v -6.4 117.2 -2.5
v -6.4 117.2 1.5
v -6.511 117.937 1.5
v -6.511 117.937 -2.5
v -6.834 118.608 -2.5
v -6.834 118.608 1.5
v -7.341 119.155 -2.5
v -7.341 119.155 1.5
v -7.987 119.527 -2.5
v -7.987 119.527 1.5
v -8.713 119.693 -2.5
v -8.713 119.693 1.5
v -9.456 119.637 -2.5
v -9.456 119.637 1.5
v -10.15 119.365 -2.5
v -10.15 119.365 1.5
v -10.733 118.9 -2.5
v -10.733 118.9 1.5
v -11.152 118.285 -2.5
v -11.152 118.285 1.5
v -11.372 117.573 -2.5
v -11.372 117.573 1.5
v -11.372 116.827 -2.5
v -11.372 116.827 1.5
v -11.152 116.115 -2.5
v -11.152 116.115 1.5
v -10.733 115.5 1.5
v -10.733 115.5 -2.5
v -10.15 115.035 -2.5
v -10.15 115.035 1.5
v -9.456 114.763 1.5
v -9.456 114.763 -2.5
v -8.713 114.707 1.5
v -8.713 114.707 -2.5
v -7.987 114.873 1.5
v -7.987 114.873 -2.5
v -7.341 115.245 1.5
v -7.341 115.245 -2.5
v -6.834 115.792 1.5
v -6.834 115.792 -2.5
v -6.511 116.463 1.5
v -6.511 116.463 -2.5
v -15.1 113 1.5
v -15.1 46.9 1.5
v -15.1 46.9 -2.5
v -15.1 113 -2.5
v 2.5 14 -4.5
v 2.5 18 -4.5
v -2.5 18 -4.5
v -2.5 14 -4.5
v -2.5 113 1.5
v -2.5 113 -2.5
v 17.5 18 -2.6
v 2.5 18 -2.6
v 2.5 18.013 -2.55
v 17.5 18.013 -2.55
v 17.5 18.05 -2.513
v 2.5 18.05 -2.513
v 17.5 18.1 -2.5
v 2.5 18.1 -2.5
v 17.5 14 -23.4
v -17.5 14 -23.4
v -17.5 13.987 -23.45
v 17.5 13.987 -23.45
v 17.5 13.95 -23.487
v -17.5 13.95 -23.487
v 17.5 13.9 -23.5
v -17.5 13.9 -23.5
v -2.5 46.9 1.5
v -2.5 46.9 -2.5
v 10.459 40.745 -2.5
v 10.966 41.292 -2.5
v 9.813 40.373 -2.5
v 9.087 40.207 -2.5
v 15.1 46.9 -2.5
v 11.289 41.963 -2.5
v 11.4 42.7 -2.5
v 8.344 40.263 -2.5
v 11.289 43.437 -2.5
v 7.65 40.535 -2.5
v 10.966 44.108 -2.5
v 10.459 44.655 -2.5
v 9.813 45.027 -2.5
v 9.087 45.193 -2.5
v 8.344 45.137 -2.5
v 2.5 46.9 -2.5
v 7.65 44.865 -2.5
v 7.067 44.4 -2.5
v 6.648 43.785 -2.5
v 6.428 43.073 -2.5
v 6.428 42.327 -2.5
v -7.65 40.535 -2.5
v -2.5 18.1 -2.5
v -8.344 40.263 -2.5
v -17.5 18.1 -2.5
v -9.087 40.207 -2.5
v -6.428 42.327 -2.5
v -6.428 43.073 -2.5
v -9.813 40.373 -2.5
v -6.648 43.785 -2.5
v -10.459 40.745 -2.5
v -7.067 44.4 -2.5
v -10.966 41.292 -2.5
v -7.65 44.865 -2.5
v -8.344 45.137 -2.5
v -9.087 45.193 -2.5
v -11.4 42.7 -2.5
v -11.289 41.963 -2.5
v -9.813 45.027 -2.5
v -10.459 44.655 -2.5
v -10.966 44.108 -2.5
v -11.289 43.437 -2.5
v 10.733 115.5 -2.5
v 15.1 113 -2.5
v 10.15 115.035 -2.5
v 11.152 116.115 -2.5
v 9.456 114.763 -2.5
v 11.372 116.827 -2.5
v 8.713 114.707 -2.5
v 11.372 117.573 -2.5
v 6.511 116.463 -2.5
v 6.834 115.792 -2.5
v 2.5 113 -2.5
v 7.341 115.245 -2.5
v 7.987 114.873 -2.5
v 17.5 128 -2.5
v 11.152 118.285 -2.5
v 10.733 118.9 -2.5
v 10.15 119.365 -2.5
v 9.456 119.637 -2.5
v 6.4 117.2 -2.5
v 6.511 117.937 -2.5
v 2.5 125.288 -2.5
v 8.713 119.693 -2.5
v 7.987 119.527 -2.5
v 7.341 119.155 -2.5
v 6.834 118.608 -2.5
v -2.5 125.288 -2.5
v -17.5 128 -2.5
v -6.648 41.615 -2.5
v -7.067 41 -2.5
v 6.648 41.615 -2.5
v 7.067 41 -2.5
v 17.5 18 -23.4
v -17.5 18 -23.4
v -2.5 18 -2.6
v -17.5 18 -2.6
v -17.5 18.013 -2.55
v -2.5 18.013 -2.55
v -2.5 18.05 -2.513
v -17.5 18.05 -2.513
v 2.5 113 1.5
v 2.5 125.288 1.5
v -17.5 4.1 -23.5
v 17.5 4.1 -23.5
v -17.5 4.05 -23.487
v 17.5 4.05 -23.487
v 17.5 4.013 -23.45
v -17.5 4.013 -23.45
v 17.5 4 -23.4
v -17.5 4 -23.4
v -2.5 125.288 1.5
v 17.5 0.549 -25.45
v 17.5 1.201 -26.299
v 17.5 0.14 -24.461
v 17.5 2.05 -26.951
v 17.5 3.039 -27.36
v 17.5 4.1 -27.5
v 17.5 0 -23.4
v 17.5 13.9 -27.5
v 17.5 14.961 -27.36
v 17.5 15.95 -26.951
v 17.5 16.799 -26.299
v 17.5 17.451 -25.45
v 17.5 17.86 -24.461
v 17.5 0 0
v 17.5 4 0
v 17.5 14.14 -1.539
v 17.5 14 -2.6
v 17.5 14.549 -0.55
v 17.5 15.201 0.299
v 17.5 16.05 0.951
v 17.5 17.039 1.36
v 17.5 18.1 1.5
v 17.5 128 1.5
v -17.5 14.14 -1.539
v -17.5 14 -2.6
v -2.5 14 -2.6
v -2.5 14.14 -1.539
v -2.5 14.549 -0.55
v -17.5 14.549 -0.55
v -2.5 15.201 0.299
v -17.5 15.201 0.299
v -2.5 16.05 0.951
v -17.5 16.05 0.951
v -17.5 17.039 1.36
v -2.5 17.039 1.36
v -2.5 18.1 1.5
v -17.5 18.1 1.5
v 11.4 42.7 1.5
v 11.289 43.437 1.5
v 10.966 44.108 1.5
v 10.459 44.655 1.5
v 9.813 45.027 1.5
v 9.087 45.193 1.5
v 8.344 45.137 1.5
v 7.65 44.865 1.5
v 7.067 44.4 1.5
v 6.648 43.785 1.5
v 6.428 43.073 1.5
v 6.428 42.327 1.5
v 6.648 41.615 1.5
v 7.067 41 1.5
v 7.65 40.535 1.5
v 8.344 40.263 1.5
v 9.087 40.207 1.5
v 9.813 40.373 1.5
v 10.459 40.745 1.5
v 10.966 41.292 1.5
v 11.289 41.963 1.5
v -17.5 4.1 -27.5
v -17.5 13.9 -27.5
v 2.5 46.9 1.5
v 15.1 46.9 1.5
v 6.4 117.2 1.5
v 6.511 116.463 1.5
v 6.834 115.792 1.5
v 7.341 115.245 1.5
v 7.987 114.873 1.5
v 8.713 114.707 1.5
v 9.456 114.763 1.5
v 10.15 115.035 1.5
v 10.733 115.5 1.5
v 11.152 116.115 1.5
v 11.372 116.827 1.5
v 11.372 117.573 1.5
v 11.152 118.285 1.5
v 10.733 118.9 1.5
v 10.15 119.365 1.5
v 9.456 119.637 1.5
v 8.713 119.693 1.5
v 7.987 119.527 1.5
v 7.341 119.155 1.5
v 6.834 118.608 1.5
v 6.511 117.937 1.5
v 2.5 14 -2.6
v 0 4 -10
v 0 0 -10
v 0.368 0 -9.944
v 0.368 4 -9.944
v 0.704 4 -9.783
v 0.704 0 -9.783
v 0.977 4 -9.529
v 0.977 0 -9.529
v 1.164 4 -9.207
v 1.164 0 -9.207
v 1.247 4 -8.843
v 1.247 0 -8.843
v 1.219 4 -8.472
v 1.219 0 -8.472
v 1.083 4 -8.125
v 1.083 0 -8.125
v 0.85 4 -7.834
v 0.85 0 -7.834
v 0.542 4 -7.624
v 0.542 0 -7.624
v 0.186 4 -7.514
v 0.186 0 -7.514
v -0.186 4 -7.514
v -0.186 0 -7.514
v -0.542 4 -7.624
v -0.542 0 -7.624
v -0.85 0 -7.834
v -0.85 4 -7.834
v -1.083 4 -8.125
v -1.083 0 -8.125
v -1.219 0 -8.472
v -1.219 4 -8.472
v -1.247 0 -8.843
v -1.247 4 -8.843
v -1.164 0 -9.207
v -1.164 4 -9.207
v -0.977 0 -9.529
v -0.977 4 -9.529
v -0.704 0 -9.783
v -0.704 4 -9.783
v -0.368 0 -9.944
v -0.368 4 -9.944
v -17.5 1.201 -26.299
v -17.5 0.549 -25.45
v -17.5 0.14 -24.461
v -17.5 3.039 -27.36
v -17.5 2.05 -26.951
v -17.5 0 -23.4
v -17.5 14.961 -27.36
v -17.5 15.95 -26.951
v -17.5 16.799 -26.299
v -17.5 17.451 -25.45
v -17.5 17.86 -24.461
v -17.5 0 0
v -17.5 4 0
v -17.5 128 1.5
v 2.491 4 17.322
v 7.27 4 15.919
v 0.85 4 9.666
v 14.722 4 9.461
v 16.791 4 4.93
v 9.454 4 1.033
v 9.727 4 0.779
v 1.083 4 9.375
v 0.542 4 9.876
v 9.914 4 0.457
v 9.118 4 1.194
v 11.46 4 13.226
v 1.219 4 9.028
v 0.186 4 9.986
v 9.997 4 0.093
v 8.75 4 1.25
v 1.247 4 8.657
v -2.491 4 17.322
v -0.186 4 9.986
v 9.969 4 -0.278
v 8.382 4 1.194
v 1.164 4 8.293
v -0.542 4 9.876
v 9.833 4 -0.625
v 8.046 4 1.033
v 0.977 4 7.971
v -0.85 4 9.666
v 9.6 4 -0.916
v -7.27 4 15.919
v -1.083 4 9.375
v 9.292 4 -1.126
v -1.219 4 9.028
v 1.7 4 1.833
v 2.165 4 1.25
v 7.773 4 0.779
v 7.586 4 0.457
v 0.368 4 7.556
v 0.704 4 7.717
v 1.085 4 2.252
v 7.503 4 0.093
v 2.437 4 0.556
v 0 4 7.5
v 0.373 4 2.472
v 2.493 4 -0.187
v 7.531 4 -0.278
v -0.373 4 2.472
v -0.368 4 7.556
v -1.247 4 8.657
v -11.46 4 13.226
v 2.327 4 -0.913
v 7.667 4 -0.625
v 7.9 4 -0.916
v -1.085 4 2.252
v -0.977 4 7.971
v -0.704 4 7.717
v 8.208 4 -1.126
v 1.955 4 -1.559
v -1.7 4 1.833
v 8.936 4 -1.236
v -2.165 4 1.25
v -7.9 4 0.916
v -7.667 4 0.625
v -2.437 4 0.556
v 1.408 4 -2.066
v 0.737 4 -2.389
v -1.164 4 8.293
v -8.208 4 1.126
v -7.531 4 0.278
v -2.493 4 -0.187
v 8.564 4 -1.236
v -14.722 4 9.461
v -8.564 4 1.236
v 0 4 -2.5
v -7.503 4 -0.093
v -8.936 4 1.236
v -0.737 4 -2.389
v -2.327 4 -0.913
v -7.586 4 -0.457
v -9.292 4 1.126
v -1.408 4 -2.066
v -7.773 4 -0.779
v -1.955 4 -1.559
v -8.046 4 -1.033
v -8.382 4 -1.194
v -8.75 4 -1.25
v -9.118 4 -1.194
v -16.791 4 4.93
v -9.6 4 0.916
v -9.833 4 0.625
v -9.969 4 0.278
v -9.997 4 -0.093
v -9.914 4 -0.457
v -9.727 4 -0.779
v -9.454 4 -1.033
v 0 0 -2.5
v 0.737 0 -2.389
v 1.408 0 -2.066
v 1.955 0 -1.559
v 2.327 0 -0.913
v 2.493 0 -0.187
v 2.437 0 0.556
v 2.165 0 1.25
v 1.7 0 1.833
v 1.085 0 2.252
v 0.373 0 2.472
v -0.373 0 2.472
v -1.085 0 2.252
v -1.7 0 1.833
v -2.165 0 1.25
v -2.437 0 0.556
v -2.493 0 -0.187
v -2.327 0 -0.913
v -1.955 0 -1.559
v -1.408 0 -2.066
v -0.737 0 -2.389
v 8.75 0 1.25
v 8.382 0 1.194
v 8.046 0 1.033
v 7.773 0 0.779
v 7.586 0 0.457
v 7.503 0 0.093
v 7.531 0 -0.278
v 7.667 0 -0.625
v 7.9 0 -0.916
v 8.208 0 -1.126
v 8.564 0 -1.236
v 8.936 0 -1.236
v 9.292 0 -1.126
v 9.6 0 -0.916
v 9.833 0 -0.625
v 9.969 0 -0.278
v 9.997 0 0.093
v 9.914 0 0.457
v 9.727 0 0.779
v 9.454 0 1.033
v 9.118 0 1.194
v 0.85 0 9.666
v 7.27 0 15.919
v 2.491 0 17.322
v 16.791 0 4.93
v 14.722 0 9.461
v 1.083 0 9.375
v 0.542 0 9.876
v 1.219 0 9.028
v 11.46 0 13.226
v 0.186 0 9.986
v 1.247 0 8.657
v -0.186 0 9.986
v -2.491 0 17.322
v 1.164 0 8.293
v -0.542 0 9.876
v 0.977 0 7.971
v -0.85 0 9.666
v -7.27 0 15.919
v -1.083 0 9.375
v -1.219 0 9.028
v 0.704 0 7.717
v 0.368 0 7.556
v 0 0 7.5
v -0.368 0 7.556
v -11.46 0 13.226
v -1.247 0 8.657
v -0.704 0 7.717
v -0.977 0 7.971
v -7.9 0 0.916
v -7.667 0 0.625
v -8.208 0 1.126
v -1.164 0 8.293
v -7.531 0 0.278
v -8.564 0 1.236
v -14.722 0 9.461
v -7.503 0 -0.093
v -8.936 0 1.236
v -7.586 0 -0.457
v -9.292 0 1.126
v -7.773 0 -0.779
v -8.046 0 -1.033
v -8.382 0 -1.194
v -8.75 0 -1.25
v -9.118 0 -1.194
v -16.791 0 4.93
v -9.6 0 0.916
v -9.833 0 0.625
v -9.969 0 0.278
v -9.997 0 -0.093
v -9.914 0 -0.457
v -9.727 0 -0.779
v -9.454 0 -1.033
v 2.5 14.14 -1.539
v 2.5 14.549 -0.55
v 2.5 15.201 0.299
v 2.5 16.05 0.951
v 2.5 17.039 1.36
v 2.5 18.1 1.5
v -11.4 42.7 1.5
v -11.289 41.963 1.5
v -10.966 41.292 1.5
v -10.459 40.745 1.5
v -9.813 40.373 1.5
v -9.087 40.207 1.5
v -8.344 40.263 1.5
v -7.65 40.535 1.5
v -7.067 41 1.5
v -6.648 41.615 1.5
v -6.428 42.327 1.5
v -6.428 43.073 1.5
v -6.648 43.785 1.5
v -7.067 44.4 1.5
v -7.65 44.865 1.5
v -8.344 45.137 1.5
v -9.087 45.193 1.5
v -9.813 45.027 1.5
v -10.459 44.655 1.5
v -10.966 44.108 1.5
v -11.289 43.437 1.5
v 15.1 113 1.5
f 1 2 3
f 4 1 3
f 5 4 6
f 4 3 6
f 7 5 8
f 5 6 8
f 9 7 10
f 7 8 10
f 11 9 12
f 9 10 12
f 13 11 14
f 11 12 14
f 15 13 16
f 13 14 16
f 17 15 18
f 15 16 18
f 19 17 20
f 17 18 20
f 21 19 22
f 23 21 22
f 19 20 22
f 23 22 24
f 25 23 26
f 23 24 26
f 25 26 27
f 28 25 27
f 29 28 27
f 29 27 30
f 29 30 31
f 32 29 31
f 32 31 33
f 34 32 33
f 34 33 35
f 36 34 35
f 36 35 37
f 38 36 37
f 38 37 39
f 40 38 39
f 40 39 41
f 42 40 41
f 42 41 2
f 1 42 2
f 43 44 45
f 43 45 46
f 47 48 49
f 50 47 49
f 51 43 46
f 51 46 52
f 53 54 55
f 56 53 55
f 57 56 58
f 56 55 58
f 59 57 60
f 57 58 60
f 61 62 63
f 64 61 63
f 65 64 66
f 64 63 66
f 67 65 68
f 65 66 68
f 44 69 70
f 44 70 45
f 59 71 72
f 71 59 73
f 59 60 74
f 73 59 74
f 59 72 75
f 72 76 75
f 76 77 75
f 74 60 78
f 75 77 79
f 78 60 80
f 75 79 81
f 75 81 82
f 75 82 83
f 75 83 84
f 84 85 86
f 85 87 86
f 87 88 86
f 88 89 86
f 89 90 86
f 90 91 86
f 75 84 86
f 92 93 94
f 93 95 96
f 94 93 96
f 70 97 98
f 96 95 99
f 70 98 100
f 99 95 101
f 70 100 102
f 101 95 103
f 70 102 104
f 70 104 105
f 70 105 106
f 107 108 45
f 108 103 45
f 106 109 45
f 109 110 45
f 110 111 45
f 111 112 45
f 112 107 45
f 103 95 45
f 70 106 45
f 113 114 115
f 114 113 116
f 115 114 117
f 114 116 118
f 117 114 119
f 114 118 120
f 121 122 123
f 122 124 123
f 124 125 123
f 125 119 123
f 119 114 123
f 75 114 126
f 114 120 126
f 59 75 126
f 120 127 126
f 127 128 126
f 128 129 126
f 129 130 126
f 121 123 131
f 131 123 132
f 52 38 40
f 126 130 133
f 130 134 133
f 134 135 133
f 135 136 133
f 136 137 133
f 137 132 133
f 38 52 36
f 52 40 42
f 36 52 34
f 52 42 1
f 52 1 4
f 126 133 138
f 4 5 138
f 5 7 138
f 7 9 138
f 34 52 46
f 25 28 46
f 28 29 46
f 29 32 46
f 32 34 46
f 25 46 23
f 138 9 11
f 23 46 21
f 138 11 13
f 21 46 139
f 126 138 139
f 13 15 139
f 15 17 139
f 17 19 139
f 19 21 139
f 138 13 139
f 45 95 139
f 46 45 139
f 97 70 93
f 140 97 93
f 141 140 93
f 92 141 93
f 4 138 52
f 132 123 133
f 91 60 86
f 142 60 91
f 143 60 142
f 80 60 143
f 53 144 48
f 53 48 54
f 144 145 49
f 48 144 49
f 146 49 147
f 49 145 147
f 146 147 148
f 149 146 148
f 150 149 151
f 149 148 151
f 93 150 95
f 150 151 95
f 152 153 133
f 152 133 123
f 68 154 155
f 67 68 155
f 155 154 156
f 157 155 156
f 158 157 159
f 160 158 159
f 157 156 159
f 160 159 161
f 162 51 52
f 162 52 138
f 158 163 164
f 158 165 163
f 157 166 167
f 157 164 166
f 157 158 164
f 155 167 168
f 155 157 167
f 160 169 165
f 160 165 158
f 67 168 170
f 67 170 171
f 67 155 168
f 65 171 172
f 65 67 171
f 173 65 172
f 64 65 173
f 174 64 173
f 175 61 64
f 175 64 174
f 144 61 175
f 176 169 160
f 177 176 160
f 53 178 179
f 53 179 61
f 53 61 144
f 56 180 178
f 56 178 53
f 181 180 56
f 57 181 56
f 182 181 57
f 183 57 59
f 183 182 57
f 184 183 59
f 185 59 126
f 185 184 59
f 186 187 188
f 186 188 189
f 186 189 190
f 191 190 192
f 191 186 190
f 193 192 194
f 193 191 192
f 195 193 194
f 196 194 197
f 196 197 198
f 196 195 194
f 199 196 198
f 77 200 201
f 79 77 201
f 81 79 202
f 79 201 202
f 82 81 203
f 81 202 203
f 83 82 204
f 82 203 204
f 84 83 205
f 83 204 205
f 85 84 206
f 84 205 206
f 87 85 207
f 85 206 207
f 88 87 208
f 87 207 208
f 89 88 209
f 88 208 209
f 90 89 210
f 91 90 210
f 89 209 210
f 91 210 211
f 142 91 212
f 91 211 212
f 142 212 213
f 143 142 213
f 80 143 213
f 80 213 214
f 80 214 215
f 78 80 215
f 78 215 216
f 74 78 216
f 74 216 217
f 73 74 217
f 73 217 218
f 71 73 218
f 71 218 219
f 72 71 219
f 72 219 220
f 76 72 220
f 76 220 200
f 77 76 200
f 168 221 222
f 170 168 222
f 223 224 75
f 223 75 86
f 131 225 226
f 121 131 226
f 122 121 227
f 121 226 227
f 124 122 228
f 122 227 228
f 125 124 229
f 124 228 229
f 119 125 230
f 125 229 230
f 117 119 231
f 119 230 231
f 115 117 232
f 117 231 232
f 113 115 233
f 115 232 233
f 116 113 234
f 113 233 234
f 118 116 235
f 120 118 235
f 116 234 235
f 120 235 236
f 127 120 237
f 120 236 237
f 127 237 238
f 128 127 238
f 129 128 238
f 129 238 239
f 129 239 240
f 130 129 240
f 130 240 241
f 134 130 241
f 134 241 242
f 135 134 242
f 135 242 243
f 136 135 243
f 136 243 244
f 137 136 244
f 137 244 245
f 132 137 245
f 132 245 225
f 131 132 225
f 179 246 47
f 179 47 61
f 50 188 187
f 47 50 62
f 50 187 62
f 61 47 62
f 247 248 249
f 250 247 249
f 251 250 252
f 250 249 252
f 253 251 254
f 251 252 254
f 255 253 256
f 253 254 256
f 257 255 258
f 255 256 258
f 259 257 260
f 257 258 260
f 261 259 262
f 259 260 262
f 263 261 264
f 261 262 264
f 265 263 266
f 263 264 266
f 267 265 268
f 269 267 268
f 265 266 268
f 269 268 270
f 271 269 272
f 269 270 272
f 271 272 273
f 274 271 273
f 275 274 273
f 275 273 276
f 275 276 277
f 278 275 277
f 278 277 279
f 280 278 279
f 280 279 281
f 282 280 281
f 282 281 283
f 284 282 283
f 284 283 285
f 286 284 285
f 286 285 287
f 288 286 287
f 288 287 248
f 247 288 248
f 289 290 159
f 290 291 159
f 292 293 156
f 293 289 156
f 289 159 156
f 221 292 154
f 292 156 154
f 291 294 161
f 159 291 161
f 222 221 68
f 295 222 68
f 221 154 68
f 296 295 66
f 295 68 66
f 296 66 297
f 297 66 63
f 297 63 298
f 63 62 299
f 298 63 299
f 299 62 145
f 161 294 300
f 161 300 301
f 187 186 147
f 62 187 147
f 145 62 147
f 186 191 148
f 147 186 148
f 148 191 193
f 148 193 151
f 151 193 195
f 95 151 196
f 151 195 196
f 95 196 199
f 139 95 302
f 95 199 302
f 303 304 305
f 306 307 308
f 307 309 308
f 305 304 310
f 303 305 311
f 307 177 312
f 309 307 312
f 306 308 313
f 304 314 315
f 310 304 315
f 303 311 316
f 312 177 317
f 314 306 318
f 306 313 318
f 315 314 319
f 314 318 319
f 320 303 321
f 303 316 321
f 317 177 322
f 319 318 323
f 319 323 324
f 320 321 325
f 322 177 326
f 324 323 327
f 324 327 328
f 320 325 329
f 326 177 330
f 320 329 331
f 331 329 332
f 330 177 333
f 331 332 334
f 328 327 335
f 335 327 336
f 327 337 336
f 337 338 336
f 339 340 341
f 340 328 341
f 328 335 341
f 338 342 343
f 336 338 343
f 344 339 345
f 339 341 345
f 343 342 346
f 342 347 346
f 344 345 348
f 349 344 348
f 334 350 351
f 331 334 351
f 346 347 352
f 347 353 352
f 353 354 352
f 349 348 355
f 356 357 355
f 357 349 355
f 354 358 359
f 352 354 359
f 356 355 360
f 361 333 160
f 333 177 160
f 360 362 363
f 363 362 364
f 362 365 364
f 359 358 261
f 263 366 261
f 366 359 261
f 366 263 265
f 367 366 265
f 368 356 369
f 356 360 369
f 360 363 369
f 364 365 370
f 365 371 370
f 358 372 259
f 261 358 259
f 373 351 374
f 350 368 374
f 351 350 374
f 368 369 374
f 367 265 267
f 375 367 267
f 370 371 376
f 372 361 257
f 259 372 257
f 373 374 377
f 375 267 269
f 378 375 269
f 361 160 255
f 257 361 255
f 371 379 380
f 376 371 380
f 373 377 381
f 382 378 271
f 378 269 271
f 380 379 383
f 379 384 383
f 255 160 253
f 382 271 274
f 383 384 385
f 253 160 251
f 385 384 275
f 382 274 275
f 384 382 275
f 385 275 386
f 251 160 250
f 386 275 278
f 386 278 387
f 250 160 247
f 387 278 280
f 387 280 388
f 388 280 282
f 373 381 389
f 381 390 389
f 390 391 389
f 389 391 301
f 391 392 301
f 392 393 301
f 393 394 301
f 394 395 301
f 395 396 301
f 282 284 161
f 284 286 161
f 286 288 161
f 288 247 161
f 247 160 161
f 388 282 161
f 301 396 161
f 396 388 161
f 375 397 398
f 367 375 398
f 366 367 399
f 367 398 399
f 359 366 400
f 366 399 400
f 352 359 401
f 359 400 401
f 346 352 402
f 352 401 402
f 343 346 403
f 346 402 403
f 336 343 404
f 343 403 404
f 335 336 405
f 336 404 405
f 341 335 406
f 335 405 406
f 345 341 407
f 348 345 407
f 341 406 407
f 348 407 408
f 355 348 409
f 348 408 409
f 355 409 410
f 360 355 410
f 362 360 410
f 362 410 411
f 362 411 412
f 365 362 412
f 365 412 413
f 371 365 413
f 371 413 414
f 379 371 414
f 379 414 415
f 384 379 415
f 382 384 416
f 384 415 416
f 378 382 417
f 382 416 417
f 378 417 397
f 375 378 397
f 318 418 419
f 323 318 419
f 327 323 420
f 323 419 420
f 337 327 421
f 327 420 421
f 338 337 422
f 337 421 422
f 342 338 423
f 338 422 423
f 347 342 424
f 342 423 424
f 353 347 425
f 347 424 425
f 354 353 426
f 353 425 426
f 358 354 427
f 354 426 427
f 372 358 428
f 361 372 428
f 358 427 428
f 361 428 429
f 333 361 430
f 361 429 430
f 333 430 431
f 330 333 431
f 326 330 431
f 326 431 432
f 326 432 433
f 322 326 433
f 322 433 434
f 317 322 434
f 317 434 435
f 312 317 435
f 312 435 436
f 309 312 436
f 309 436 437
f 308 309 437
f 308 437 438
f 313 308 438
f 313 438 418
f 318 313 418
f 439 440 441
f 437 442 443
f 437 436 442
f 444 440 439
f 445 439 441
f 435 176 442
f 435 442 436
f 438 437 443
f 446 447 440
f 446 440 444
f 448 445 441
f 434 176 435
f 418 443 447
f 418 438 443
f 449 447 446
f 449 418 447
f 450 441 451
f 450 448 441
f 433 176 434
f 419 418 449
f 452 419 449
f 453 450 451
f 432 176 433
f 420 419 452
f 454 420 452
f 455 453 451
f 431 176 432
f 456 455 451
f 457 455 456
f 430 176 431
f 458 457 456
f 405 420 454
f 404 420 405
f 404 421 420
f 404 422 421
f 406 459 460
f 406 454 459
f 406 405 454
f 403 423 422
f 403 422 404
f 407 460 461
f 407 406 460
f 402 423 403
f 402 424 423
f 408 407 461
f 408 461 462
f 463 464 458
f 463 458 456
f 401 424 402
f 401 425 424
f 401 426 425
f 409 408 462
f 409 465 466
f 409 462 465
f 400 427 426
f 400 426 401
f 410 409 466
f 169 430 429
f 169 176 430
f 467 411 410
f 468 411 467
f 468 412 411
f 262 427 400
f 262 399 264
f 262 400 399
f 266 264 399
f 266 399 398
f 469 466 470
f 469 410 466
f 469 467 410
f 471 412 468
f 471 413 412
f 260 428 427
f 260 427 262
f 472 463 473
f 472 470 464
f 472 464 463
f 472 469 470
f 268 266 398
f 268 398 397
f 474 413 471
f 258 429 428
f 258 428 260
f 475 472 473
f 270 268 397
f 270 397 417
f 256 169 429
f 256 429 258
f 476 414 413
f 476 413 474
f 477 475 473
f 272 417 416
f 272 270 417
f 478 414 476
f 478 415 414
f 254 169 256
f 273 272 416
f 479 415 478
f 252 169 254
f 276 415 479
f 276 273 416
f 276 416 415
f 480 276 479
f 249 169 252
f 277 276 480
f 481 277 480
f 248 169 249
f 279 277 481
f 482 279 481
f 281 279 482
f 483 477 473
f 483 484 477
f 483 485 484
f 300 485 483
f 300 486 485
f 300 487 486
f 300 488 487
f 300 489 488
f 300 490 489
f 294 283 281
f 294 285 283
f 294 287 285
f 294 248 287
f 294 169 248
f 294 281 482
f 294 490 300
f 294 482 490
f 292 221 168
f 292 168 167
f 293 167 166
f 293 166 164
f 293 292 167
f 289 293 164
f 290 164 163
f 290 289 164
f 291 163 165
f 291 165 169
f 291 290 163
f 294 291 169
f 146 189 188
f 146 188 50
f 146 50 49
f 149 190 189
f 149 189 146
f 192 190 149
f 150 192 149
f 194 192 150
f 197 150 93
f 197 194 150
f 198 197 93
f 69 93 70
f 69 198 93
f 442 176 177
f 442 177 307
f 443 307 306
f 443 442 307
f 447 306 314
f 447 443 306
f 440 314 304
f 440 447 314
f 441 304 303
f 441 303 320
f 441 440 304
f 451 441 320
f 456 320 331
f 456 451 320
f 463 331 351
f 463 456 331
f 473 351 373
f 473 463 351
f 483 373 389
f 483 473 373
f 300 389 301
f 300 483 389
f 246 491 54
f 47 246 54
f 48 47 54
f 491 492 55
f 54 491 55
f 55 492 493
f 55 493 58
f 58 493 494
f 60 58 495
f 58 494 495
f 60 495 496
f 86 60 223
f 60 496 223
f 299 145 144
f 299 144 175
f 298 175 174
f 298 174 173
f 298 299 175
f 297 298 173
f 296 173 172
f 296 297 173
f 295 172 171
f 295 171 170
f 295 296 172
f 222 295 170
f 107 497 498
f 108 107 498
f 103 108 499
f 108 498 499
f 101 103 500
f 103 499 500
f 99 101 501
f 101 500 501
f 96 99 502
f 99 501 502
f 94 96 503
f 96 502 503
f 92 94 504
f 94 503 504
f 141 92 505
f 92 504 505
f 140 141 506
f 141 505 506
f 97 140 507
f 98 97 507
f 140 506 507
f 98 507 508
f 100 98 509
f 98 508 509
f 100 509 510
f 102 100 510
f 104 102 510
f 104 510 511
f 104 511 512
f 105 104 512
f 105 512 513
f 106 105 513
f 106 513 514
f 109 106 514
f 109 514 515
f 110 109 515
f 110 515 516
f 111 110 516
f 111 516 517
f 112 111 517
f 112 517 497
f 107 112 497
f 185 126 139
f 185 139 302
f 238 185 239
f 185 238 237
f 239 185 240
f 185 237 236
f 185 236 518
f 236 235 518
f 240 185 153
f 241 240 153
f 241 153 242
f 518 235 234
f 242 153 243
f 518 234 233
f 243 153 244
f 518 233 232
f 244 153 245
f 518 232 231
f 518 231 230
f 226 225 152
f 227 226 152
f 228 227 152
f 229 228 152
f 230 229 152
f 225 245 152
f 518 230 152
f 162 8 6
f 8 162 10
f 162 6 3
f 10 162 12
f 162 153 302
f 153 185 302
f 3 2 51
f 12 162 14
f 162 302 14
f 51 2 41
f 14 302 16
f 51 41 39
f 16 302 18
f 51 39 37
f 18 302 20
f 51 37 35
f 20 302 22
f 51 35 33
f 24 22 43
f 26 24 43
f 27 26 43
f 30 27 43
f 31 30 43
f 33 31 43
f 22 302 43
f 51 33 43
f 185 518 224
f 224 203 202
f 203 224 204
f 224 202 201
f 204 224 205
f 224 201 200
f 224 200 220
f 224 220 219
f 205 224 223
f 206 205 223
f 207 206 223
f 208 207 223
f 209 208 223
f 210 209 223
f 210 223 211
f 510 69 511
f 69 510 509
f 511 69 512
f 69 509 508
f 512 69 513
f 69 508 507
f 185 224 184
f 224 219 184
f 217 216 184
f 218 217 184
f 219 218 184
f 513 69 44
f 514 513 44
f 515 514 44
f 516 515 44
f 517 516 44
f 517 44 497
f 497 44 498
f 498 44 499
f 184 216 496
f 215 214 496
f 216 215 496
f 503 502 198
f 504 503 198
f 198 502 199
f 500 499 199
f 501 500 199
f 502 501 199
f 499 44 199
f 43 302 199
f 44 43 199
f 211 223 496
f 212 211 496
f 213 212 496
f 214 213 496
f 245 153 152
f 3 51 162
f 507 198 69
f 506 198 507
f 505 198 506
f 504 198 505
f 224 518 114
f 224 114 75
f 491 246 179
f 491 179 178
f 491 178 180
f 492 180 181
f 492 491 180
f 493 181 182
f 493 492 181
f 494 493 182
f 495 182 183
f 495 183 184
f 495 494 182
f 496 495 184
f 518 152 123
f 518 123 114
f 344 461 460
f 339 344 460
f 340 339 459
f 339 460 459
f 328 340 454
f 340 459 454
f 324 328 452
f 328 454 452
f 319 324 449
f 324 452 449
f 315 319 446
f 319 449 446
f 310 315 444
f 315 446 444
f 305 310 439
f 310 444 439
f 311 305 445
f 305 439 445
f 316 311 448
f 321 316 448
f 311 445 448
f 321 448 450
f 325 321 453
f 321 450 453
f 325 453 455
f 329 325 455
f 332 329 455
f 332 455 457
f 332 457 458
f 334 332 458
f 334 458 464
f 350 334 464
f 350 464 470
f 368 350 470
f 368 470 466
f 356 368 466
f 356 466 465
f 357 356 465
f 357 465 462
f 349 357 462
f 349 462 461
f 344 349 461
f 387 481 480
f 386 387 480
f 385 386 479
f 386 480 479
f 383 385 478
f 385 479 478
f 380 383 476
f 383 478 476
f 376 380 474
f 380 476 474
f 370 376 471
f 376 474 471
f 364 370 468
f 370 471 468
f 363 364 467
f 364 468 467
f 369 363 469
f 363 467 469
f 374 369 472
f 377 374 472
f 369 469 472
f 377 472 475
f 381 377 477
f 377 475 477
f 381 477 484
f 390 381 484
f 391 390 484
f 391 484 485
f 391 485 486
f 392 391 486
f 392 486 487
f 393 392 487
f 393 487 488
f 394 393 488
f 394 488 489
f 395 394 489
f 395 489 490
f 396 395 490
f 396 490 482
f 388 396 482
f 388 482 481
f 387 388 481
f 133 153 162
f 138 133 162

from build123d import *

# Parameters (mm, degrees)
BOSS_EXTRUDE2_DEPTH    = 4
SKETCH4_W              = 35
SKETCH4_H              = 4
BOSS_EXTRUDE3_DEPTH    = 10
BOSS_EXTRUDE4_DEPTH    = 35
SKETCH9_R              = 2.5
CUT_EXTRUDE1_DEPTH     = 6
SKETCH10_R             = 1.25
CUT_EXTRUDE2_DEPTH     = 6
SKETCH11_R             = 2.5
CUT_EXTRUDE3_DEPTH     = 4
CONVERT_SOLID2_START   = -17.5
CONVERT_SOLID2_DEPTH   = 35
CONVERT_SOLID2_2_DEPTH = 35
CONVERT_SOLID2_3_DEPTH = 15
CONVERT_SOLID2_START_2 = 2.5
CONVERT_SOLID2_4_DEPTH = 15


# Read off the part's stored shape, not the designer's step: Convert-Solid2
with BuildPart() as part:
    # Sketch3 → Boss-Extrude2 (new body)
    with BuildSketch(Plane(origin=(0, 0, 0), x_dir=(1, 0, 0), z_dir=(0, 1, 0))):
        with BuildLine():
            Line((-17.5, 0), (-17.5, 27.5))
            Line((-17.5, 27.5), (17.5, 27.5))
            Line((17.5, 27.5), (17.5, 0))
            ThreePointArc((17.5, 0), (0, -17.5), (-17.5, 0))
        make_face()
    extrude(amount=BOSS_EXTRUDE2_DEPTH)

    # Sketch4 → Boss-Extrude3 (add)
    with BuildSketch(Plane(origin=(0, 4, 0), x_dir=(1, 0, 0), z_dir=(0, 1, 0))):
        with Locations((0, 25.5)):
            Rectangle(SKETCH4_W, SKETCH4_H)
    extrude(amount=BOSS_EXTRUDE3_DEPTH)

    # Sketch6 → Boss-Extrude4 (add)
    with BuildSketch(Plane.ZY.offset(17.5)):
        Polygon((-27.5, 14), (-27.5, 18), (-2.5, 18), (-2.5, 128), (1.5, 128), (1.5, 14), align=None)
    extrude(amount=-BOSS_EXTRUDE4_DEPTH)

    # Sketch9 → Cut-Extrude1 (cut)
    with BuildSketch(Plane.XY.offset(1.5)):
        with Locations((-8.9, 117.2)):
            Circle(SKETCH9_R)
        with Locations(Location((8.9, 117.2, 0), (0, 0, 180))):
            Circle(SKETCH9_R)
        with Locations(Location((-8.9, 42.7, 0), (0, 0, 180))):
            Circle(SKETCH9_R)
        with Locations((8.9, 42.7)):
            Circle(SKETCH9_R)
        Polygon((-15.1, 113), (-2.5, 113), (-2.5, 125.287895972), (0, 125.287895972), (2.5, 125.287895972), (2.5, 113), (15.1, 113), (15.1, 46.9), (2.5, 46.9), (2.5, 10), (-2.5, 10), (-2.5, 46.9), (-15.1, 46.9), align=None)
    extrude(amount=-CUT_EXTRUDE1_DEPTH, mode=Mode.SUBTRACT)

    # Sketch10 → Cut-Extrude2 (cut)
    with BuildSketch(Plane.XZ):
        with Locations(Location((-8.75, 0, 0), (0, 0, 270))):
            Circle(SKETCH10_R)
        with Locations(Location((8.75, 0, 0), (0, 0, 90))):
            Circle(SKETCH10_R)
        with Locations(Location((0, 8.75, 0), (0, 0, 270))):
            Circle(SKETCH10_R)
        with Locations(Location((0, -8.75, 0), (0, 0, 270))):
            Circle(SKETCH10_R)
    extrude(amount=-CUT_EXTRUDE2_DEPTH, mode=Mode.SUBTRACT)

    # Sketch11 → Cut-Extrude3 (cut)
    with BuildSketch(Plane.XZ):
        with Locations(Location((0, 0, 0), (0, 0, 270))):
            Circle(SKETCH11_R)
    extrude(amount=-CUT_EXTRUDE3_DEPTH, mode=Mode.SUBTRACT)

    # Convert-Solid2 outline → Convert-Solid2 (cut)
    with BuildSketch(Plane.YZ.offset(CONVERT_SOLID2_START)):
        with BuildLine():
            Line((0, -27.5), (4.1, -27.5))
            ThreePointArc((4.1, -27.5), (1.200862197, -26.299137803), (0, -23.4))
            Line((0, -23.4), (0, -27.5))
        make_face()
        with BuildLine():
            Line((18, -27.5), (18, -23.4))
            ThreePointArc((18, -23.4), (16.799137803, -26.299137803), (13.9, -27.5))
            Line((13.9, -27.5), (18, -27.5))
        make_face()
        with BuildLine():
            ThreePointArc((14, -2.6), (15.200862197, 0.299137803), (18.1, 1.5))
            Line((18.1, 1.5), (14, 1.5))
            Line((14, 1.5), (14, -2.6))
        make_face()
    extrude(amount=CONVERT_SOLID2_DEPTH, mode=Mode.SUBTRACT)

    # Convert-Solid2 2 outline → Convert-Solid2 2 (add)
    with BuildSketch(Plane.YZ.offset(CONVERT_SOLID2_START)):
        with BuildLine():
            Line((4, -23.5), (4.1, -23.5))
            ThreePointArc((4.1, -23.5), (4.029289322, -23.470710678), (4, -23.4))
            Line((4, -23.4), (4, -23.5))
        make_face()
        with BuildLine():
            Line((14, -23.5), (14, -23.4))
            ThreePointArc((14, -23.4), (13.970710678, -23.470710678), (13.9, -23.5))
            Line((13.9, -23.5), (14, -23.5))
        make_face()
    extrude(amount=CONVERT_SOLID2_2_DEPTH)

    # Convert-Solid2 3 outline → Convert-Solid2 3 (add)
    with BuildSketch(Plane.YZ.offset(CONVERT_SOLID2_START)):
        with BuildLine():
            ThreePointArc((18, -2.6), (18.029289322, -2.529289322), (18.1, -2.5))
            Line((18.1, -2.5), (18, -2.5))
            Line((18, -2.5), (18, -2.6))
        make_face()
    extrude(amount=CONVERT_SOLID2_3_DEPTH)

    # Convert-Solid2 4 outline → Convert-Solid2 4 (add)
    with BuildSketch(Plane.YZ.offset(CONVERT_SOLID2_START_2)):
        with BuildLine():
            ThreePointArc((18, -2.6), (18.029289322, -2.529289322), (18.1, -2.5))
            Line((18.1, -2.5), (18, -2.5))
            Line((18, -2.5), (18, -2.6))
        make_face()
    extrude(amount=CONVERT_SOLID2_4_DEPTH)


solid = part.part
